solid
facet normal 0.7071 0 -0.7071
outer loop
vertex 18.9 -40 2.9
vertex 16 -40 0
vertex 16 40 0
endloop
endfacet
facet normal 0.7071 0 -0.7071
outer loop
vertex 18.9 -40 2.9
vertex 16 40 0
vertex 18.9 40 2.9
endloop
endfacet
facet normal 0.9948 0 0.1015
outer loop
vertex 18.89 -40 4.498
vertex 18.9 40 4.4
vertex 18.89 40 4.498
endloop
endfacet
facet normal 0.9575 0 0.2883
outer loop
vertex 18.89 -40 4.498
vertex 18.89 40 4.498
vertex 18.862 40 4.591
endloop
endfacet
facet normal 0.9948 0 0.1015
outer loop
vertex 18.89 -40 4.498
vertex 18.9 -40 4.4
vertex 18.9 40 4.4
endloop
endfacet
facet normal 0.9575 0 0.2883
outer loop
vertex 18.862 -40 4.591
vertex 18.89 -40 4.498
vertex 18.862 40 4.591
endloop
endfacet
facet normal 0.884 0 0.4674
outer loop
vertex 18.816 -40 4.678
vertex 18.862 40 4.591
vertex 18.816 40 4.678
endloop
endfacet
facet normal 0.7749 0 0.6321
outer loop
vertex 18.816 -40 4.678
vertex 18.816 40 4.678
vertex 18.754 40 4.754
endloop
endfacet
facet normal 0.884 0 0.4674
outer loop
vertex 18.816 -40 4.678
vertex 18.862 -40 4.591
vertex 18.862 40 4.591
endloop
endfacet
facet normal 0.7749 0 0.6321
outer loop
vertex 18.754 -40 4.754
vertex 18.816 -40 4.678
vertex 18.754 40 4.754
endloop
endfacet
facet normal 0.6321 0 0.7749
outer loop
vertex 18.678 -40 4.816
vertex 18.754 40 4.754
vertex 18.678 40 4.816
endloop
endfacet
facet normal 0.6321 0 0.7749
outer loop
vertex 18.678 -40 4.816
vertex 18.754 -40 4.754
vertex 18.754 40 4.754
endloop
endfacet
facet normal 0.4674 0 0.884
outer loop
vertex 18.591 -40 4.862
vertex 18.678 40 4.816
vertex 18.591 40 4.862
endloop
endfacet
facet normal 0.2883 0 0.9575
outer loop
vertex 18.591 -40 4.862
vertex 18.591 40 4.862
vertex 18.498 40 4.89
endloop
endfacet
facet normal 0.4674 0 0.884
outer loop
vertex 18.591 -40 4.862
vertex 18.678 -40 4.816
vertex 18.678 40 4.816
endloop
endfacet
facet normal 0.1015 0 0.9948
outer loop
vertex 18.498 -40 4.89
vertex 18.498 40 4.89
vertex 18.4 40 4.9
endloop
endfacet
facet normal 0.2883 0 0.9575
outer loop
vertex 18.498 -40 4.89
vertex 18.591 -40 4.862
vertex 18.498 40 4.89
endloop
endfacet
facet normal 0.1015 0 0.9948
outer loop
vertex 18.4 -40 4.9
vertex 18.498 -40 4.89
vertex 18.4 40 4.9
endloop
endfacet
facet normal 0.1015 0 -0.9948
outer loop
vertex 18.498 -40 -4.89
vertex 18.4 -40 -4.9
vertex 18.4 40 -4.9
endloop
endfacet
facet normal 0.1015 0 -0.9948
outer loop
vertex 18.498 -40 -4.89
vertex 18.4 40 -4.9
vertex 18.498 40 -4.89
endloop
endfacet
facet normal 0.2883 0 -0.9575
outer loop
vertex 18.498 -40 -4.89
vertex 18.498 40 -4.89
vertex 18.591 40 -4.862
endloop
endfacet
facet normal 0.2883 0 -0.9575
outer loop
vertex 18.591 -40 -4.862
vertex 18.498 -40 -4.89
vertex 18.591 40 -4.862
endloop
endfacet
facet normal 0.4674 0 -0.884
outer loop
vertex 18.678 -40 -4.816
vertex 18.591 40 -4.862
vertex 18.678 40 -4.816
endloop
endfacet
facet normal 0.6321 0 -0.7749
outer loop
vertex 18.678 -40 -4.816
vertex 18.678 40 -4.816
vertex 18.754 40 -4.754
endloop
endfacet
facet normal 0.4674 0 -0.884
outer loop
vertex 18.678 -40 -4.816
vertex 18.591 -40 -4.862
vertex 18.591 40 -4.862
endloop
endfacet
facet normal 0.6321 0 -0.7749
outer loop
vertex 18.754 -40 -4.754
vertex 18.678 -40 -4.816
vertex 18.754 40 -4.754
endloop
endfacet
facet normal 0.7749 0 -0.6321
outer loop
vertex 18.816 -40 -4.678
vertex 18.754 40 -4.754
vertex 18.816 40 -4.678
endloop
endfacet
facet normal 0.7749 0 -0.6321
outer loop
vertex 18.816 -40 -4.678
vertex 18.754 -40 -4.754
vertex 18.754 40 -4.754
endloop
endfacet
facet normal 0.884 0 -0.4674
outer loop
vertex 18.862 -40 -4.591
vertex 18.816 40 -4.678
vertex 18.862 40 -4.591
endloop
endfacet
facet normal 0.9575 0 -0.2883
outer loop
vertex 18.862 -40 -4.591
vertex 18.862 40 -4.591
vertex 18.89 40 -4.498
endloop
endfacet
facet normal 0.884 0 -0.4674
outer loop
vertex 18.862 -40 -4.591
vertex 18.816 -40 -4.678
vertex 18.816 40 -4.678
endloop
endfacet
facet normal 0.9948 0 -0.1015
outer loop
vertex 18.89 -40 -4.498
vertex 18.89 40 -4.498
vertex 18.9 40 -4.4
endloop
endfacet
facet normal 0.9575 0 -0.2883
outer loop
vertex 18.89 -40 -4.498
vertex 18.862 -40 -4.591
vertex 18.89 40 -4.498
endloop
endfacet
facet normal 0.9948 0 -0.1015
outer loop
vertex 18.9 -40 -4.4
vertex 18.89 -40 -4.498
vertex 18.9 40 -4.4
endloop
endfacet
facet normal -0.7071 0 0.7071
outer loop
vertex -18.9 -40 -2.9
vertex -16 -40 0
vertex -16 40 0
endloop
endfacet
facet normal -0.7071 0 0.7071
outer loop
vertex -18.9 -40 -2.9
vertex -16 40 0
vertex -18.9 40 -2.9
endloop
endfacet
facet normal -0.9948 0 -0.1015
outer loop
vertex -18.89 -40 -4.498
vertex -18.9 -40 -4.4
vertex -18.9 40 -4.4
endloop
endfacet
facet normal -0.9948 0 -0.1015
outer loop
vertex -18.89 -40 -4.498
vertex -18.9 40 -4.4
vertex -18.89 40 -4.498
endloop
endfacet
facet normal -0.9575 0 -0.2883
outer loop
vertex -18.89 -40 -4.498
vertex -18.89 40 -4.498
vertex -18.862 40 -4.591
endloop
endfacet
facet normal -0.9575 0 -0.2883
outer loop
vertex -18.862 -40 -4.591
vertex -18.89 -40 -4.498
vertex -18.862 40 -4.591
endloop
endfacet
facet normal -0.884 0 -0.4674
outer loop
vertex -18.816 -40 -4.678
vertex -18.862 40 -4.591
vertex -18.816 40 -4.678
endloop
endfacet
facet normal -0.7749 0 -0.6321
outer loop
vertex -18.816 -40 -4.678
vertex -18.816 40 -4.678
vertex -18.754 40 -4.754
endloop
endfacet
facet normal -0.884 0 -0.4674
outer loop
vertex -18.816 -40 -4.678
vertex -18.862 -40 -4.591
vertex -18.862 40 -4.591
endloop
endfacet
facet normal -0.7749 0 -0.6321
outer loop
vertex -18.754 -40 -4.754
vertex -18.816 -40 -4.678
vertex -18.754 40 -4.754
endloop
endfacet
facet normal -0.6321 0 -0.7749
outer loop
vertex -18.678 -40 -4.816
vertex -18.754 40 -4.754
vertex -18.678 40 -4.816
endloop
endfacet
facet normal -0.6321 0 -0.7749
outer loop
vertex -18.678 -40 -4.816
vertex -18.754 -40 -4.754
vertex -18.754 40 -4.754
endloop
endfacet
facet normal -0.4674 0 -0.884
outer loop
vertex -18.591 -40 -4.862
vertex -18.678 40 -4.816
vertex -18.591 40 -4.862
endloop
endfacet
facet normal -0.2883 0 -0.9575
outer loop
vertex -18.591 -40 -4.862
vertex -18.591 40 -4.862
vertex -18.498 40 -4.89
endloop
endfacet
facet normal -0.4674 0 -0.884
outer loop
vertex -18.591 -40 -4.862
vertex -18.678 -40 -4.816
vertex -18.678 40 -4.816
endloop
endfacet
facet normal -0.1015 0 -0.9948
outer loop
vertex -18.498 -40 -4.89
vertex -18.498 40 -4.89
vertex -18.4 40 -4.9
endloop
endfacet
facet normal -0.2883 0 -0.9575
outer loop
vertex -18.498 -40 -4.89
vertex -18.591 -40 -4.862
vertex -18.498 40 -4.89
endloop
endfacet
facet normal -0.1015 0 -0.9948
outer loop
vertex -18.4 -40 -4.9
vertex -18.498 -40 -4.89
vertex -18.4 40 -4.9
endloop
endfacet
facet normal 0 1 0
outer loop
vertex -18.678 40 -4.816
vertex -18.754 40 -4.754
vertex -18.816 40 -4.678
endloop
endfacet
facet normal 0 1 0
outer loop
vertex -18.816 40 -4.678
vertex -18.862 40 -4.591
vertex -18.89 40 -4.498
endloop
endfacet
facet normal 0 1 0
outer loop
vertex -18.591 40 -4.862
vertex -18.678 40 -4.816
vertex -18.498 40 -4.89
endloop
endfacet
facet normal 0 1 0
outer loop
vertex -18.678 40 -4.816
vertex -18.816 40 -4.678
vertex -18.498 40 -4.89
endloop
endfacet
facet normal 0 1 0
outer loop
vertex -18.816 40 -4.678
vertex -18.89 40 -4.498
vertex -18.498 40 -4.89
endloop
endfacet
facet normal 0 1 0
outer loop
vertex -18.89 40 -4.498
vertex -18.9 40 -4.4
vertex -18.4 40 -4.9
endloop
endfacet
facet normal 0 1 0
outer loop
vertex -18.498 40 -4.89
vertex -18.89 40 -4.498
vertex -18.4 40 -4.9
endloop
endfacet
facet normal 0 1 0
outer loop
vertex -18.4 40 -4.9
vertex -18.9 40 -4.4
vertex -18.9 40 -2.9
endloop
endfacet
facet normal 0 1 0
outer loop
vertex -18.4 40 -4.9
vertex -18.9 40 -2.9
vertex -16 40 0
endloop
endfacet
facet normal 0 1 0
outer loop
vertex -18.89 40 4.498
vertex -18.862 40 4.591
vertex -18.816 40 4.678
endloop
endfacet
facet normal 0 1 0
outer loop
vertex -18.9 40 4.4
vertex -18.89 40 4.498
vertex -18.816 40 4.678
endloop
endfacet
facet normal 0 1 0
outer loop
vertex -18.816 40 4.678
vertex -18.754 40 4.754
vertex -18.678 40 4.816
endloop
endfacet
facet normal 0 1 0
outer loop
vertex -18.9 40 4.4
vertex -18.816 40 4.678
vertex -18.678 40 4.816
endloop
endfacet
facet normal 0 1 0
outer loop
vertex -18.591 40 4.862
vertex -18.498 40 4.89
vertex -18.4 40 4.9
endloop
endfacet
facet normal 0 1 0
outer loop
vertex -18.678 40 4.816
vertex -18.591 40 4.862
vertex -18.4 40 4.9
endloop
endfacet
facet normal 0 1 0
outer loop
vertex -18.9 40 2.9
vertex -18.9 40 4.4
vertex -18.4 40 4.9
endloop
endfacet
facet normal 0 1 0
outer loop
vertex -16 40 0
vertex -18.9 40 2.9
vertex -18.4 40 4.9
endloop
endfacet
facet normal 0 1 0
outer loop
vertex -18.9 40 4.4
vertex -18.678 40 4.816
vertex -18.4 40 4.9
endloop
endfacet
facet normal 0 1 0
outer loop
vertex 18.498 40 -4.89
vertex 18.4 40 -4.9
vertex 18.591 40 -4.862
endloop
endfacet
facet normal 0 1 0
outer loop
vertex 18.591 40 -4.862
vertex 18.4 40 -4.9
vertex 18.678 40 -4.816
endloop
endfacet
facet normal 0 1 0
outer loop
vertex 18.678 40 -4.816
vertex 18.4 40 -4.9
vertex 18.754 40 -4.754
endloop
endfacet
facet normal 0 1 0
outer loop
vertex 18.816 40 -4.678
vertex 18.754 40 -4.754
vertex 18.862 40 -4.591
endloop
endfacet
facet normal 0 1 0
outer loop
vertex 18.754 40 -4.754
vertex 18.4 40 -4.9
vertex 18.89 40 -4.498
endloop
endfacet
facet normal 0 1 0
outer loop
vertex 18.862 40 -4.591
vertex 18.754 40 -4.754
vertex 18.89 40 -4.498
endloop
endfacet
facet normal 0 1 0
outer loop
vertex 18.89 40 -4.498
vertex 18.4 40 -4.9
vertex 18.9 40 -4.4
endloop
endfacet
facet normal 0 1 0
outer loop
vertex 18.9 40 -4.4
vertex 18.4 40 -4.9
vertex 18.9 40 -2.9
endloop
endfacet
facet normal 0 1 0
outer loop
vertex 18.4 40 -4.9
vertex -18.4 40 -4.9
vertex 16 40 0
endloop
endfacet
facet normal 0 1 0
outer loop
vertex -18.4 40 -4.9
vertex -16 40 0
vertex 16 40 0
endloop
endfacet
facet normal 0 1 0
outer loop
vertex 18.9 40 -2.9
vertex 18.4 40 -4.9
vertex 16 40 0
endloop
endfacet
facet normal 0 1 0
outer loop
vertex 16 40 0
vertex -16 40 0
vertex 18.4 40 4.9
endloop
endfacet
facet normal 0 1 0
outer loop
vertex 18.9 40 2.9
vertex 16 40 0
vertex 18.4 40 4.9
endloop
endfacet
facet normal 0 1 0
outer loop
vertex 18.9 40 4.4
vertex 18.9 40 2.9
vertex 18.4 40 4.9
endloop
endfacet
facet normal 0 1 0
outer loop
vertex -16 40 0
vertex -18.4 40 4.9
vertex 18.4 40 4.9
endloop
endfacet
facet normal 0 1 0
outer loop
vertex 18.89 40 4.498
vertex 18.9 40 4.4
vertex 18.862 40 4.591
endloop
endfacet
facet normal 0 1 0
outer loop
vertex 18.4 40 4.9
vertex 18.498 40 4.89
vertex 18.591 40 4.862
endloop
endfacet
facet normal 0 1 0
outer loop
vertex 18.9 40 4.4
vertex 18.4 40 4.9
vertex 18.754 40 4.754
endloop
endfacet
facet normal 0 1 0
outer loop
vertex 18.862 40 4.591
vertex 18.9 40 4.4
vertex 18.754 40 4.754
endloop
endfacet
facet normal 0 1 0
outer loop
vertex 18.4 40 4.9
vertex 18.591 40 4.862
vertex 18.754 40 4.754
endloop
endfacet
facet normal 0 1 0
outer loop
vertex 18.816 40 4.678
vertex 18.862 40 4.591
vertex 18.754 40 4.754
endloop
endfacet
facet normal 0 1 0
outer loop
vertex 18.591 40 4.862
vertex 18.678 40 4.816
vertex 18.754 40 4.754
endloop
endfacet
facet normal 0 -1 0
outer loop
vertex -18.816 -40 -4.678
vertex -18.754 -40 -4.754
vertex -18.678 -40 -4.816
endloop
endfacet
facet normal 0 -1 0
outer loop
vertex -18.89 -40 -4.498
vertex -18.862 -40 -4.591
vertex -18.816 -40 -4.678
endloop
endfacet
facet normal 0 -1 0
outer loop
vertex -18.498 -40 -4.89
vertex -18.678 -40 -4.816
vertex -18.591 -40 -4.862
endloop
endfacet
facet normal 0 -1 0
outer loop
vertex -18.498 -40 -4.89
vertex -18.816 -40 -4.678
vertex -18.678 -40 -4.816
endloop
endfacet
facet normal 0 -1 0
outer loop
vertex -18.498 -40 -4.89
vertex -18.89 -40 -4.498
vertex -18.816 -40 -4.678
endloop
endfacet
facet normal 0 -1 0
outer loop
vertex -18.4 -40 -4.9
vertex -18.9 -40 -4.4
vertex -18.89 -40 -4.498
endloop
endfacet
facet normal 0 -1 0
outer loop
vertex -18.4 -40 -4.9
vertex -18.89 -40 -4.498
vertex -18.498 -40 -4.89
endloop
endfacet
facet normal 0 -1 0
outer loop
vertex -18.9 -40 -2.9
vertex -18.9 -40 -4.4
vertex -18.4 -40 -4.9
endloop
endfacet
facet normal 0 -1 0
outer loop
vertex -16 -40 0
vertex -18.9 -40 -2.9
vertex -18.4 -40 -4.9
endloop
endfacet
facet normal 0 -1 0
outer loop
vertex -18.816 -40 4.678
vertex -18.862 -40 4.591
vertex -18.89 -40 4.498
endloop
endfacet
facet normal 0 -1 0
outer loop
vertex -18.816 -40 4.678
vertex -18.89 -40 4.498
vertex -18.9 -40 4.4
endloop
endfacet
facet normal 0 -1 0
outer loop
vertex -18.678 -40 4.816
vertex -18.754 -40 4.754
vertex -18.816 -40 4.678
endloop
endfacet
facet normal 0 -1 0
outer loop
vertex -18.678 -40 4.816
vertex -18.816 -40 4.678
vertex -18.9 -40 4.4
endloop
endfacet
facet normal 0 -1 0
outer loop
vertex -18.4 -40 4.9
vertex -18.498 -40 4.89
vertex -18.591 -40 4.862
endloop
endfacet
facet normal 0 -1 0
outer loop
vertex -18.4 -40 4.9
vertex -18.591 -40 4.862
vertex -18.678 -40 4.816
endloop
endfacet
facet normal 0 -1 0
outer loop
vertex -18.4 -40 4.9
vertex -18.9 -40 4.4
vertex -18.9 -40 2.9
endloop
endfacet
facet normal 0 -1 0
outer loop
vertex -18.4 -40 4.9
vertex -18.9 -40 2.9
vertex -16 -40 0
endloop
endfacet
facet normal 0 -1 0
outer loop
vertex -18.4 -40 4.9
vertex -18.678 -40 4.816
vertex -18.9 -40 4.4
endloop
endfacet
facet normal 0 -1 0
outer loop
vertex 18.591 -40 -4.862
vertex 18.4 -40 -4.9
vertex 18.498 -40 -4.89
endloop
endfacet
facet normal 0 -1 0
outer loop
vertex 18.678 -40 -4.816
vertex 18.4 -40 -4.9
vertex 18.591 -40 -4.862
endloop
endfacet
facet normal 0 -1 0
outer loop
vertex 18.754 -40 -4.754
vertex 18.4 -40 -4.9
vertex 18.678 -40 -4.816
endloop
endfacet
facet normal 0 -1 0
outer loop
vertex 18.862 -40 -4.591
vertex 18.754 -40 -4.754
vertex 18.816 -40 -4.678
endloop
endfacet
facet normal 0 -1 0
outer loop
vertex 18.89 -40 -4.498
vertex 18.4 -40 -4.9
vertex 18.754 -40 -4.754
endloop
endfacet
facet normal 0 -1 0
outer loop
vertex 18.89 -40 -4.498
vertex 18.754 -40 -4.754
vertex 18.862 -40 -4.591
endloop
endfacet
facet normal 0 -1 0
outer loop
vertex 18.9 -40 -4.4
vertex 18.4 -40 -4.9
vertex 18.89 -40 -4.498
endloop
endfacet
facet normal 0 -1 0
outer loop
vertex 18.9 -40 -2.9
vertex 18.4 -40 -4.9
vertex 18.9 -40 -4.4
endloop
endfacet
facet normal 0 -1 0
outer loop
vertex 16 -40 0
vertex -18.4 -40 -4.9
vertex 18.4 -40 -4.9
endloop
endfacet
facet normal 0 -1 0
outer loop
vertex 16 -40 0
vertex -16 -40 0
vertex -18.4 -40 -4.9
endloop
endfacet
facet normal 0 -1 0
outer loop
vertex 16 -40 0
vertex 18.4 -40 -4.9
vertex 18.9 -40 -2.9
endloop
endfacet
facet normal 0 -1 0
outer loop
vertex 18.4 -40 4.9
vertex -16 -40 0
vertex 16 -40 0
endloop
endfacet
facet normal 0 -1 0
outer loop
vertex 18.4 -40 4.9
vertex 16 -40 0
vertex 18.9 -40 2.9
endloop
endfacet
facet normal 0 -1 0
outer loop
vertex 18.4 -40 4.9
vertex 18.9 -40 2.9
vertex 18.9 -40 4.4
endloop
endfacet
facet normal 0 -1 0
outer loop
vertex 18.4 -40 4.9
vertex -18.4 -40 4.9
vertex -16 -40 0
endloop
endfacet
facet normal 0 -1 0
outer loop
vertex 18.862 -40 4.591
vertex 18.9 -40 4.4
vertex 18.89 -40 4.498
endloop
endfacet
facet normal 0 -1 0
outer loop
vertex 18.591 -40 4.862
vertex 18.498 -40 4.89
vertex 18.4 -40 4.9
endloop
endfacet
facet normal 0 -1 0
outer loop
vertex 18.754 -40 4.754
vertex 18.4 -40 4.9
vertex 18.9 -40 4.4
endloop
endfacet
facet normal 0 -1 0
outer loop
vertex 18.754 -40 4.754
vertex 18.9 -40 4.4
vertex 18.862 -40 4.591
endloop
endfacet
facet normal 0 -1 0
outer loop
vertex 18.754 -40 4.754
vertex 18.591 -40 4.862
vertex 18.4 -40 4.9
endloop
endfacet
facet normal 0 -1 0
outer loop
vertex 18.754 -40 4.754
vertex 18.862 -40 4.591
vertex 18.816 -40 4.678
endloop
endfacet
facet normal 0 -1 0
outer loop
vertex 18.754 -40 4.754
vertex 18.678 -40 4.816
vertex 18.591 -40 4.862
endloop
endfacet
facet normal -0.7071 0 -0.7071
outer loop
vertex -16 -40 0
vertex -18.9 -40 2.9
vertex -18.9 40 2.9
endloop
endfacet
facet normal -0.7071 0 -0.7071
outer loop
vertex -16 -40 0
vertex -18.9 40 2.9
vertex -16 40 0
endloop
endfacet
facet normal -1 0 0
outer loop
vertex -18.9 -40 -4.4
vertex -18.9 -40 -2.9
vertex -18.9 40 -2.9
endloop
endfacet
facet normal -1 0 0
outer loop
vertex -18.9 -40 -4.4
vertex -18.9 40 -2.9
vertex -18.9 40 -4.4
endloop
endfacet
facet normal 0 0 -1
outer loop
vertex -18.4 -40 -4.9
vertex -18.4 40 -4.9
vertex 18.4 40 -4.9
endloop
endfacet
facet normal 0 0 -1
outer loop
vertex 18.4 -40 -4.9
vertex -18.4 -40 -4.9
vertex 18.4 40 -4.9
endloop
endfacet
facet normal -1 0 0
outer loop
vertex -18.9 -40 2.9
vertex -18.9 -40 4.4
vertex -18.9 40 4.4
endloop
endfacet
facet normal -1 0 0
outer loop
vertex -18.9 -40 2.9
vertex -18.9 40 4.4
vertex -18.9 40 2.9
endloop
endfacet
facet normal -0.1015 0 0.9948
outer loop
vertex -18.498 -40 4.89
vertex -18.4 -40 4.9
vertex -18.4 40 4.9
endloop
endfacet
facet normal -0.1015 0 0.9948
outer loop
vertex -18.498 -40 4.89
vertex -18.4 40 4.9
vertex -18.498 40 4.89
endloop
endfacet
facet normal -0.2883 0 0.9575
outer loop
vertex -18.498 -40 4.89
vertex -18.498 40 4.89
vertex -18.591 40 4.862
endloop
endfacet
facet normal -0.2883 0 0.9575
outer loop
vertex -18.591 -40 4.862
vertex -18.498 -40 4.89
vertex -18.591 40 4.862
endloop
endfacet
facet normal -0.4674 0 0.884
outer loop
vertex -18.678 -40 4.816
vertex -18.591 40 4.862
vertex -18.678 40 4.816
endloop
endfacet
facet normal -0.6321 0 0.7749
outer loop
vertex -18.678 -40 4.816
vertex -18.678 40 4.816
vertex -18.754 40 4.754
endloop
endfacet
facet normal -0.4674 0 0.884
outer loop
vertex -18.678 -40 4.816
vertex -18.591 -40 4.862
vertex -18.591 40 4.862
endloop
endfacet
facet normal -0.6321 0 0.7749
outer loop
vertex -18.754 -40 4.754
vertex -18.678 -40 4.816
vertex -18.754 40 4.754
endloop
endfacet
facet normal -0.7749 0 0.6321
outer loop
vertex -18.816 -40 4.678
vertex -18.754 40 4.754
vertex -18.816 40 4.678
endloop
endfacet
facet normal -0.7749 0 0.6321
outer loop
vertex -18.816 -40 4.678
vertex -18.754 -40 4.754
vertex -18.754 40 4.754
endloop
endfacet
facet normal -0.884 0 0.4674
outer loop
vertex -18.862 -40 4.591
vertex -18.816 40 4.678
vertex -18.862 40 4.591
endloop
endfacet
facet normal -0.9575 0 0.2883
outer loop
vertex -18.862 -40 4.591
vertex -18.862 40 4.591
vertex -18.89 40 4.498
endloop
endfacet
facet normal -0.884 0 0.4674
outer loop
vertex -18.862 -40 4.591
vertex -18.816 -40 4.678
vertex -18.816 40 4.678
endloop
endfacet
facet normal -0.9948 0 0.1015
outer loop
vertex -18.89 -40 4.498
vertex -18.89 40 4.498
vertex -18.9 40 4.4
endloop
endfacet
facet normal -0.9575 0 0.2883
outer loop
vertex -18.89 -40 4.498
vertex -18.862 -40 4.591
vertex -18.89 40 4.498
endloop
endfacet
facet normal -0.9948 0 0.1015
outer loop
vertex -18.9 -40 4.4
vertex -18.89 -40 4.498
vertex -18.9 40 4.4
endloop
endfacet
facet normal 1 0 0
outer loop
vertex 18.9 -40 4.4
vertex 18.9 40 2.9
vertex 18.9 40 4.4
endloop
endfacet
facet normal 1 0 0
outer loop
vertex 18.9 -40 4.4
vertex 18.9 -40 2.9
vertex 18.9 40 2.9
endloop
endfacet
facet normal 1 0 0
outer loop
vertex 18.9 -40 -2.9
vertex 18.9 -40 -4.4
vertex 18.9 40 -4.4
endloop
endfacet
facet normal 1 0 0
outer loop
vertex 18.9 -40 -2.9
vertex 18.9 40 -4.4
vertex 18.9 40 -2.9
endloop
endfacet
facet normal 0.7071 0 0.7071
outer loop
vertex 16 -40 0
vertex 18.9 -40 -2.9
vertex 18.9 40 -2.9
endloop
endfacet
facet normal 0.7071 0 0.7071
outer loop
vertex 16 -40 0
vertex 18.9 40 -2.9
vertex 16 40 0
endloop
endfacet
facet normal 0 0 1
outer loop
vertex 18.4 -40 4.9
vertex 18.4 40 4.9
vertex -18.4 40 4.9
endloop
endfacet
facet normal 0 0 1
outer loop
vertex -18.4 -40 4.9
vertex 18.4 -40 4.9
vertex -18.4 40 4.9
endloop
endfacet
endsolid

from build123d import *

# Parameters (mm, degrees)
F1_DEPTH      = 40
F1_DEPTH_BACK = 40


with BuildPart() as f1:
    # F0 (on Front) → F1 (new body, two sides)
    with BuildSketch(Plane.XZ) as f1_sk:
        with BuildLine():
            Line((18.4, 4.9), (0, 4.9))
            Line((0, 4.9), (-18.4, 4.9))
            ThreePointArc((-18.4, 4.9), (-18.753553, 4.753553), (-18.9, 4.4))
            Line((-18.9, 4.4), (-18.9, 2.9))
            Line((-18.9, 2.9), (-16, 0))
            Line((-16, 0), (-18.9, -2.9))
            Line((-18.9, -2.9), (-18.9, -4.4))
            ThreePointArc((-18.9, -4.4), (-18.753553, -4.753553), (-18.4, -4.9))
            Line((-18.4, -4.9), (0, -4.9))
            Line((0, -4.9), (18.4, -4.9))
            ThreePointArc((18.4, -4.9), (18.753553, -4.753553), (18.9, -4.4))
            Line((18.9, -4.4), (18.9, -2.9))
            Line((18.9, -2.9), (16, 0))
            Line((16, 0), (18.9, 2.9))
            Line((18.9, 2.9), (18.9, 4.4))
            ThreePointArc((18.9, 4.4), (18.753553, 4.753553), (18.4, 4.9))
        make_face()
    extrude(amount=F1_DEPTH)
    extrude(f1_sk.sketch, amount=-F1_DEPTH_BACK)


solid = f1.part
